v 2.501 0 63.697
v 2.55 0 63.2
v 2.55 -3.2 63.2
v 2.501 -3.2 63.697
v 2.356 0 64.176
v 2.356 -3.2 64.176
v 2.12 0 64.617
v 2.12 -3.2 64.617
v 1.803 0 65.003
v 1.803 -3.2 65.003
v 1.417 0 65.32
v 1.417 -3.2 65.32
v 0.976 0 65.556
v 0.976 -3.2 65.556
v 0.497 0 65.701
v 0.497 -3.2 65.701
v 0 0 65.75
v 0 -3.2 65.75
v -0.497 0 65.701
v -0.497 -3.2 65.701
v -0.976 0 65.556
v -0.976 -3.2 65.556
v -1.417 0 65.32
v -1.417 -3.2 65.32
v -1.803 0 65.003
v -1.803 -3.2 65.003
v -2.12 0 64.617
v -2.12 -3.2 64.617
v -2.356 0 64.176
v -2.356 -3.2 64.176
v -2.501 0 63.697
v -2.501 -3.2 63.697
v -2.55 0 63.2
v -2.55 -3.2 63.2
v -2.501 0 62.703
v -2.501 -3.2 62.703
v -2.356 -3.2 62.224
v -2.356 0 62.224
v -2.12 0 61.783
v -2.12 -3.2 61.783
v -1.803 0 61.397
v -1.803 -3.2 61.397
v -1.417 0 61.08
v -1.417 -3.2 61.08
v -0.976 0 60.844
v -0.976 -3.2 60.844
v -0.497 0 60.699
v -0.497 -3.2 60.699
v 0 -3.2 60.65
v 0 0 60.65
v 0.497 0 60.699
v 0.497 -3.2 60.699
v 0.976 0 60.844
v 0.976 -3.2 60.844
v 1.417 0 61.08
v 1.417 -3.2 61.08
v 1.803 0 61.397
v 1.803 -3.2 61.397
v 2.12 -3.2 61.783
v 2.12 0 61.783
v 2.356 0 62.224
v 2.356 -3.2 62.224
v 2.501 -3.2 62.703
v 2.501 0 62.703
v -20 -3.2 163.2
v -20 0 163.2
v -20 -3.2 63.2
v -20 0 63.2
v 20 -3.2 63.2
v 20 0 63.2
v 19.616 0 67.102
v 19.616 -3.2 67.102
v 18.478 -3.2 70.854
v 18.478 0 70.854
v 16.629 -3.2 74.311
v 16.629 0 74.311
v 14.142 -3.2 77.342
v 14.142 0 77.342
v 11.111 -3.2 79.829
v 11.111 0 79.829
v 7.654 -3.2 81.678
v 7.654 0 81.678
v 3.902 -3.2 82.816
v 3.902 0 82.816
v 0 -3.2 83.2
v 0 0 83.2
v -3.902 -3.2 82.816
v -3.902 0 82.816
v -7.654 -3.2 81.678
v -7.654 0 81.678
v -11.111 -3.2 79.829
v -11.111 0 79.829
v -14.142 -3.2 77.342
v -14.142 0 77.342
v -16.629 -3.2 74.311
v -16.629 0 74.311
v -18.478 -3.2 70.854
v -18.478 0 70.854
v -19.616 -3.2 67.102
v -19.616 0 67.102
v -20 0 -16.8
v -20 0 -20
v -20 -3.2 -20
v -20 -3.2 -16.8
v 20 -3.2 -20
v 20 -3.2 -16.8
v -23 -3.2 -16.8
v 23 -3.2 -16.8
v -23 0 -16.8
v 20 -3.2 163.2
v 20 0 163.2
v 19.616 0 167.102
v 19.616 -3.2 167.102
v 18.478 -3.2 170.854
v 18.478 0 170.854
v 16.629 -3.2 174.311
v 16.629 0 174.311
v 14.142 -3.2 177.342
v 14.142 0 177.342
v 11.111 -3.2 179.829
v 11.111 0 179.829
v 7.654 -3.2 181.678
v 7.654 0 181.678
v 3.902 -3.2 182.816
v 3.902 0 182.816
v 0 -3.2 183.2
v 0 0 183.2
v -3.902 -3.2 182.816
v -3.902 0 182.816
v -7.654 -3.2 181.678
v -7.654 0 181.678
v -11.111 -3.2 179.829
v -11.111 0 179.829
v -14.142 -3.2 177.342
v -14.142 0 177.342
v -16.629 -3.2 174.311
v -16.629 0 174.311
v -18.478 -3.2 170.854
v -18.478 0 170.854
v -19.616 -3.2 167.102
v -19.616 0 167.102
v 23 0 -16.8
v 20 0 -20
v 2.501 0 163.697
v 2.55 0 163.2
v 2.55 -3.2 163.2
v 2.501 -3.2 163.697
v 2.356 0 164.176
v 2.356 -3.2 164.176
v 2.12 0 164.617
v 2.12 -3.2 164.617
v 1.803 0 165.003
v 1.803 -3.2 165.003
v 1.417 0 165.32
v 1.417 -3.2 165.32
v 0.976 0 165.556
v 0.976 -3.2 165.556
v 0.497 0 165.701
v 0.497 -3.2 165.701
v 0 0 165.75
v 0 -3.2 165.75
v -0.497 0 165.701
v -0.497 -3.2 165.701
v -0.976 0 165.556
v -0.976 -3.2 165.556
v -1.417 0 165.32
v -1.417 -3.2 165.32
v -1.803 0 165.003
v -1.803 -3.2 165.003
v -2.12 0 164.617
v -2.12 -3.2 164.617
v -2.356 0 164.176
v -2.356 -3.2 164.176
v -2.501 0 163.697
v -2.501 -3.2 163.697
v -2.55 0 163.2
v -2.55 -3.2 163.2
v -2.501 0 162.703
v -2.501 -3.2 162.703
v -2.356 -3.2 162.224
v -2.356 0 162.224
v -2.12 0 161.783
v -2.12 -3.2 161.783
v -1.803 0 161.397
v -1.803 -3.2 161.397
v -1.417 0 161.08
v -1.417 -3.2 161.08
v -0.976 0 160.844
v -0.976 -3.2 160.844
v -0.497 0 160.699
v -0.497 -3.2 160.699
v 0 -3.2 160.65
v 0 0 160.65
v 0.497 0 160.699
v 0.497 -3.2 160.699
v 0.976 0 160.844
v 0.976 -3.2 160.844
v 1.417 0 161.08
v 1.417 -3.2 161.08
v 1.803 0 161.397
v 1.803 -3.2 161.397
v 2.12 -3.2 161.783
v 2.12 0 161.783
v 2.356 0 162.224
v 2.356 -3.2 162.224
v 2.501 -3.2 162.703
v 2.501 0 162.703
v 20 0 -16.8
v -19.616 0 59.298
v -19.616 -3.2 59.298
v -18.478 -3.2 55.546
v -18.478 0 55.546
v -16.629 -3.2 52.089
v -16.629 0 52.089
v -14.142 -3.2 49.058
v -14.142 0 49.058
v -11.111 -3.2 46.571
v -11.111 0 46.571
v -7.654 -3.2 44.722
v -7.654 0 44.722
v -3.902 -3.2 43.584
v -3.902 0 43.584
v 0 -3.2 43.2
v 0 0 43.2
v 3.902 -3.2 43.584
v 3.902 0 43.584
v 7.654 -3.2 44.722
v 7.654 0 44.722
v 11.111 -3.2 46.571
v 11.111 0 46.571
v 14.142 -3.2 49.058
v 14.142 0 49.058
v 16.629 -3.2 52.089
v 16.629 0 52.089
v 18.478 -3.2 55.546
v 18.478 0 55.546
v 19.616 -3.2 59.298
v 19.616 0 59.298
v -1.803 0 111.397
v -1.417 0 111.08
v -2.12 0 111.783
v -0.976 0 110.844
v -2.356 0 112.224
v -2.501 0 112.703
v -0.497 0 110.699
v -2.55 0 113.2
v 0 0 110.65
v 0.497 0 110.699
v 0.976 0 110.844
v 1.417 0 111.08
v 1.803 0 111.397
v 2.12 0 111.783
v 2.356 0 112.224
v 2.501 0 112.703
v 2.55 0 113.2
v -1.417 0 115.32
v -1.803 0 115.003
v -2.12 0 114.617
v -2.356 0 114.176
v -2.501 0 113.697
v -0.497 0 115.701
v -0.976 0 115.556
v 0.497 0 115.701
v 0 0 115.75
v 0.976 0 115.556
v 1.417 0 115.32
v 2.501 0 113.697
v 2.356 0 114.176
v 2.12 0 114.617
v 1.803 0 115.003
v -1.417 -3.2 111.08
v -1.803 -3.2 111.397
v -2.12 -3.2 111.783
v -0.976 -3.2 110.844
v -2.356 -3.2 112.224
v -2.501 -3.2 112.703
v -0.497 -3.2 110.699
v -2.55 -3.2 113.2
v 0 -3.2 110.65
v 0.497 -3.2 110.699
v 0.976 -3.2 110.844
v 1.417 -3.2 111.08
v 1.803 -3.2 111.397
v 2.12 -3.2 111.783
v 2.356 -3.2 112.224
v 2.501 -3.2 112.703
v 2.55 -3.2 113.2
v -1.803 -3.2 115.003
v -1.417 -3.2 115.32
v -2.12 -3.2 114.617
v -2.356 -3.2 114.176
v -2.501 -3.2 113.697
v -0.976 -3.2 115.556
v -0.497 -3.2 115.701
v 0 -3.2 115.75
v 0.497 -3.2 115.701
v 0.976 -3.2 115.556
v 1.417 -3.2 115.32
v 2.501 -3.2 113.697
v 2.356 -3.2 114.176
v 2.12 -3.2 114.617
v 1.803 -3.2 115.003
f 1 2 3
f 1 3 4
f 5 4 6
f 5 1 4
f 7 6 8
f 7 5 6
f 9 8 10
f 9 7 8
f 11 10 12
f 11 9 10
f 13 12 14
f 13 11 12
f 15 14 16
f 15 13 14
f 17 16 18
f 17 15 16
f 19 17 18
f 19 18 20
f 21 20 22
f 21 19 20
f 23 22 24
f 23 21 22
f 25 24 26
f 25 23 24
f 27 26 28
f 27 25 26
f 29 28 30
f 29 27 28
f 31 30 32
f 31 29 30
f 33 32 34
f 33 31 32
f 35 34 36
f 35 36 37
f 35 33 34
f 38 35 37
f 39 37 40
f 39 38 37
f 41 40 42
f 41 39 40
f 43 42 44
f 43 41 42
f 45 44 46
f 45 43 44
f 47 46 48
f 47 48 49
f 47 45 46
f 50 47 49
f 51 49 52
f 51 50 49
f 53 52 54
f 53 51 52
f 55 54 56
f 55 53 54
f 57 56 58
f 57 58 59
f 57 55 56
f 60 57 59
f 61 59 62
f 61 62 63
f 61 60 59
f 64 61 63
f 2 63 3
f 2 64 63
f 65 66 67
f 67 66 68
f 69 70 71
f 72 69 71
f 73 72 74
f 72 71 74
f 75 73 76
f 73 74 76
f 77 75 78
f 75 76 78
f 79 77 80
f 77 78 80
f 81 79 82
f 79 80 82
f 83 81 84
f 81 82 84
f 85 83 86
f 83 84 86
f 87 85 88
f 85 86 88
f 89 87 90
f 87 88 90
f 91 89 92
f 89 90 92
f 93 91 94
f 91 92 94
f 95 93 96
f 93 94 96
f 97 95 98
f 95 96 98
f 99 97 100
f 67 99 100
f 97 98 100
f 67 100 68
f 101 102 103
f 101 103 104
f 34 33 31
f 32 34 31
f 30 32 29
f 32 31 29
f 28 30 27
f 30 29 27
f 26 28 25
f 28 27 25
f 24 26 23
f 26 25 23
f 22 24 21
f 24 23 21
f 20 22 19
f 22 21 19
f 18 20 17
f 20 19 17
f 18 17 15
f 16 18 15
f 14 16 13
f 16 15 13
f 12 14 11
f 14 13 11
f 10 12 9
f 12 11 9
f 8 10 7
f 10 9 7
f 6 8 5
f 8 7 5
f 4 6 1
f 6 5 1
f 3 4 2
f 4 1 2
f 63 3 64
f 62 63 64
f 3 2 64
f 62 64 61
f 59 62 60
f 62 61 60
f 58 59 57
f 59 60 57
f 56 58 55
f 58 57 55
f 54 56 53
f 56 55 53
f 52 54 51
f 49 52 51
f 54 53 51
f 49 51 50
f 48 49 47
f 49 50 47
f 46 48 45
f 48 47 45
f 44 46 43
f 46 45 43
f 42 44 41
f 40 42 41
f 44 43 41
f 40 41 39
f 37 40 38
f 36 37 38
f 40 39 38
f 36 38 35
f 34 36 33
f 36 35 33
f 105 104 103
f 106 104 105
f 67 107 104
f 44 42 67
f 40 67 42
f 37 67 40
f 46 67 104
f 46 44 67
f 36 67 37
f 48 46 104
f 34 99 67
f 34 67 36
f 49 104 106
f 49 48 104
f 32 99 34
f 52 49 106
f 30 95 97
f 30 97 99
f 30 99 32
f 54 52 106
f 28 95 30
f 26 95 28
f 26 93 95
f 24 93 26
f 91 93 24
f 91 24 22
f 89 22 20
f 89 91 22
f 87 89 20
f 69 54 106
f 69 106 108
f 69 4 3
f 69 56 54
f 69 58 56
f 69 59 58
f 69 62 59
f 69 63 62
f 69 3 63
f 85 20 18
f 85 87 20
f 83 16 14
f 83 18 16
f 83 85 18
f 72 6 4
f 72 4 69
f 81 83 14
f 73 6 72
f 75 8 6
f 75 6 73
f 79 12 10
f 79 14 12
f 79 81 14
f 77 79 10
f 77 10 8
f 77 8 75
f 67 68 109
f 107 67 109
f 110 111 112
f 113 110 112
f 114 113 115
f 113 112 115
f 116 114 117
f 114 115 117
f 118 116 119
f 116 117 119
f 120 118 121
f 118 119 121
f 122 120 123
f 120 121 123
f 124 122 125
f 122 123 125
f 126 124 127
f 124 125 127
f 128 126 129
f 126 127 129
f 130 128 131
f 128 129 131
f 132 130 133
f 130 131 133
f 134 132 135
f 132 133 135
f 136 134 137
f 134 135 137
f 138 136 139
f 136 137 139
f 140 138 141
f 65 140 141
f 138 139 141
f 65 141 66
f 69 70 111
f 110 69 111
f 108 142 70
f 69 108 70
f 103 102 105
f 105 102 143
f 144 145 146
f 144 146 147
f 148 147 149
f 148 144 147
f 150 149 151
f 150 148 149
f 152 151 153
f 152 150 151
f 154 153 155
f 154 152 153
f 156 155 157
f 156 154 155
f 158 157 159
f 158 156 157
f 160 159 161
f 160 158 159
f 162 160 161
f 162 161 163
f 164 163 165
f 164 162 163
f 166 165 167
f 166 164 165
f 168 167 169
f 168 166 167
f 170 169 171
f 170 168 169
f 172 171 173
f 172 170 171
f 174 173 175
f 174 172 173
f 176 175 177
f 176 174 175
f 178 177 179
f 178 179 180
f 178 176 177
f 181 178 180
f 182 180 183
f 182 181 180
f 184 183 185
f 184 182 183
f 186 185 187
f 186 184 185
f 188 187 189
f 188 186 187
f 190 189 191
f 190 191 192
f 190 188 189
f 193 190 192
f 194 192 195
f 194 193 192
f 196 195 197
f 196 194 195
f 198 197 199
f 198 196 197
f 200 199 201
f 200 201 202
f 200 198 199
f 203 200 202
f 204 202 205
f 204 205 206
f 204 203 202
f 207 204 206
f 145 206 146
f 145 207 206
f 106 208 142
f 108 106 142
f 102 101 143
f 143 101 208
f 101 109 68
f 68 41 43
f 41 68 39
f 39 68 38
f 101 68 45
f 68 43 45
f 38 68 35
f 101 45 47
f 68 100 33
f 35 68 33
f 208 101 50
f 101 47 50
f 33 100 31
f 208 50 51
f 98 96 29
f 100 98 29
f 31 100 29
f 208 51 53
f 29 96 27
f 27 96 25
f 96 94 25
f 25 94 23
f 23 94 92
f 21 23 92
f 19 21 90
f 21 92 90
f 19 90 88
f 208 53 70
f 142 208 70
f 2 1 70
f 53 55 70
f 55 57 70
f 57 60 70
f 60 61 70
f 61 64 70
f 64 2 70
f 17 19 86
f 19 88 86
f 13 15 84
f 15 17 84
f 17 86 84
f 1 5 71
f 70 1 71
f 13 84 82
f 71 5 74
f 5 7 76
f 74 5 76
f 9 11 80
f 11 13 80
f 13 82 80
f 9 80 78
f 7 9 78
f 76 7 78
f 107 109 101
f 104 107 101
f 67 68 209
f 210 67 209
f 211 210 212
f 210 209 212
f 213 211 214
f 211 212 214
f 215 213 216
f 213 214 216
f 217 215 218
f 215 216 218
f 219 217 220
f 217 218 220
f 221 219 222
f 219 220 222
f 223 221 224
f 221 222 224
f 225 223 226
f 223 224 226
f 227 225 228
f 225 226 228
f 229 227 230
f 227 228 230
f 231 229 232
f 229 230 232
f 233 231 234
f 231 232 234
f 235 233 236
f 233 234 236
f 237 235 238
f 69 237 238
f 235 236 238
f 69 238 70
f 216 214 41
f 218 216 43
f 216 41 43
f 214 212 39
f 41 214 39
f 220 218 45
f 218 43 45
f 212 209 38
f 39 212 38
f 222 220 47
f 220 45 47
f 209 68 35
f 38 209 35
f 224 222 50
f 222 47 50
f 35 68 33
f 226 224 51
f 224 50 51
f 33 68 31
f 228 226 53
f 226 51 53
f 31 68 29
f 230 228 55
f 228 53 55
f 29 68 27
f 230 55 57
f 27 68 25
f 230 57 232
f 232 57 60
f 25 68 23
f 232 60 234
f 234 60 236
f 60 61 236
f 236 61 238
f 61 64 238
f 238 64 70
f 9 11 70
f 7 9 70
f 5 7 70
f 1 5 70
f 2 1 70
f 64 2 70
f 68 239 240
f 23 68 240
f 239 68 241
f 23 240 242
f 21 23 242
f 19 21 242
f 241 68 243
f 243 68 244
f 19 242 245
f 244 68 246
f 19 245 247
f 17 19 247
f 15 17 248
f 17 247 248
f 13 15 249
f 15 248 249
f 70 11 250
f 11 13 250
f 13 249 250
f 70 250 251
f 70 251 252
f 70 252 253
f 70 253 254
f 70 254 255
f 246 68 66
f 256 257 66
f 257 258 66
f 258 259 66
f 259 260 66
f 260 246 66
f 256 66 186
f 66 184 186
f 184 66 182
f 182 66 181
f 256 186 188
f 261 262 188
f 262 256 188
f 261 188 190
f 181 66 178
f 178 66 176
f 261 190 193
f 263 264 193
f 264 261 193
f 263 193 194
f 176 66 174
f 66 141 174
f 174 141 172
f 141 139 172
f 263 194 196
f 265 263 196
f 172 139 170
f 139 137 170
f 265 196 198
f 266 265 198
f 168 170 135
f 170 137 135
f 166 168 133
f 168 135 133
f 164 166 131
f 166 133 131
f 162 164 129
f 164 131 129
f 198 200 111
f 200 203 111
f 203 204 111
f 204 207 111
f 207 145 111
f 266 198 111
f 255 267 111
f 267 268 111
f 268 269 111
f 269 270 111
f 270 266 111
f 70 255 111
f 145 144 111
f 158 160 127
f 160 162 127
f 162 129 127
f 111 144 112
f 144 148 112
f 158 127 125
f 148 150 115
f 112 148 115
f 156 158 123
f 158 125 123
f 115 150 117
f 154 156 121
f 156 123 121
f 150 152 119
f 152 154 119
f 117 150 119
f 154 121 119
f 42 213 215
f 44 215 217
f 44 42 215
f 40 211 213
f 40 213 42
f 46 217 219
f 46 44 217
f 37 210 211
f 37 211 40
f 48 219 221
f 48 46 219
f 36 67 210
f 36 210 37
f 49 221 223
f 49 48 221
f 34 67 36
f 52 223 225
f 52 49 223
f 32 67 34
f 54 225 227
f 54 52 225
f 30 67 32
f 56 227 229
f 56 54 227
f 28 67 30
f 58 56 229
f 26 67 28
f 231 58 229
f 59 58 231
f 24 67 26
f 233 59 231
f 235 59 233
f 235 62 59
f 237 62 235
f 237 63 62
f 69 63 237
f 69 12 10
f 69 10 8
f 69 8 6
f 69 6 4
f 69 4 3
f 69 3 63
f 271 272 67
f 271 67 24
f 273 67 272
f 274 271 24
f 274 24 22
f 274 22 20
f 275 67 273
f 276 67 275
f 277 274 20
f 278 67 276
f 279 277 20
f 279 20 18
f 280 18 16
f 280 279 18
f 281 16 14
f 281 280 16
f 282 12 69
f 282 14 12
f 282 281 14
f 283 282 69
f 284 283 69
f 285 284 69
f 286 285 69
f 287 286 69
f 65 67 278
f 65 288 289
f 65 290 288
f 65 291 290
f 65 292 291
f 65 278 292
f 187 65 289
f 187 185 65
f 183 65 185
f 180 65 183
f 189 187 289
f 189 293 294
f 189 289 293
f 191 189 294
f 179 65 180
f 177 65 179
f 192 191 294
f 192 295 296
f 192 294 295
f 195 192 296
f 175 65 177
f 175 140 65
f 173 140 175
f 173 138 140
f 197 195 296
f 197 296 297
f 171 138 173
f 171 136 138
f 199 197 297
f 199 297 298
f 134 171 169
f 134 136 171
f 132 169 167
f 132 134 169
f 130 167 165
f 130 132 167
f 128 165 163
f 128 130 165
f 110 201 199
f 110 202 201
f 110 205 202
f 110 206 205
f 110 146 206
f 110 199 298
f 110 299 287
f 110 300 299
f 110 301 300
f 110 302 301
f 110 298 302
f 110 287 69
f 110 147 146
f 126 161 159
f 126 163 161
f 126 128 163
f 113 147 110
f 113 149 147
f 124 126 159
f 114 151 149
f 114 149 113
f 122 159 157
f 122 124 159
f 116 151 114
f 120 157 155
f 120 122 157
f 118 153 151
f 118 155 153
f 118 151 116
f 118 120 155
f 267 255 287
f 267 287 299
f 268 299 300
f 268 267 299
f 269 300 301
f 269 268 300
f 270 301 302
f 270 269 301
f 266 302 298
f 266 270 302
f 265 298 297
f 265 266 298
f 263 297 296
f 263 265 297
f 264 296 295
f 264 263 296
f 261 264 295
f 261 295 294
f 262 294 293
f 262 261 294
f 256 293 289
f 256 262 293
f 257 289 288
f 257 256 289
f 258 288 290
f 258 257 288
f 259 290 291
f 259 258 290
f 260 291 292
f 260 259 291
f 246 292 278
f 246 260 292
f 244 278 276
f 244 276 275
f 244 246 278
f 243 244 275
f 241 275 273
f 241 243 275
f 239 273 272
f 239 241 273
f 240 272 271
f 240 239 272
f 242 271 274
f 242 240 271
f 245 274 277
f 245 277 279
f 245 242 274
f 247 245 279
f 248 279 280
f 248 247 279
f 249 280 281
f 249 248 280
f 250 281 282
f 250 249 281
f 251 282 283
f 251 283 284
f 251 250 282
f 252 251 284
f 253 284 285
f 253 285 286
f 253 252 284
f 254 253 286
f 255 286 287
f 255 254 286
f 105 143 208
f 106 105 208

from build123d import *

# Parameters (mm, degrees)
F0_R     = 2.55
F0_W     = 40
F0_H     = 3.2
F1_DEPTH = 3.2
F2_R     = 2.55
F3_DEPTH = 3.2


with BuildPart() as f1:
    # F0 (on Front) → F1 (new body)
    with BuildSketch(Plane.XZ):
        with BuildLine():
            Line((-23, -16.8), (-20, -16.8))
            Line((-20, -16.8), (20, -16.8))
            Line((20, -16.8), (23, -16.8))
            Line((23, -16.8), (20, 63.2))
            ThreePointArc((20, 63.2), (0, 83.2), (-20, 63.2))
            Line((-20, 63.2), (-23, -16.8))
        make_face()
        with Locations((0, 63.2)):
            Circle(F0_R, mode=Mode.SUBTRACT)
        with Locations((0, -18.4)):
            Rectangle(F0_W, F0_H)
    extrude(amount=F1_DEPTH)


with BuildPart() as f3:
    # F2 (on Front) → F3 (new body)
    with BuildSketch(Plane.XZ):
        with BuildLine():
            Line((20, 63.2), (2.55, 63.2))
            ThreePointArc((2.55, 63.2), (0, 60.65), (-2.55, 63.2))
            Line((-2.55, 63.2), (-20, 63.2))
            ThreePointArc((-20, 63.2), (0, 43.2), (20, 63.2))
        make_face()
        with BuildLine():
            ThreePointArc((-2.55, 63.2), (0, 65.75), (2.55, 63.2))
            Line((2.55, 63.2), (20, 63.2))
            Line((20, 63.2), (20, 163.2))
            ThreePointArc((20, 163.2), (0, 183.2), (-20, 163.2))
            Line((-20, 163.2), (-20, 63.2))
            Line((-20, 63.2), (-2.55, 63.2))
        make_face()
        with Locations((0, 113.2)):
            Circle(F2_R, mode=Mode.SUBTRACT)
        with Locations((0, 163.2)):
            Circle(F2_R, mode=Mode.SUBTRACT)
    extrude(amount=F3_DEPTH)


solid = Compound([f1.part, f3.part])
